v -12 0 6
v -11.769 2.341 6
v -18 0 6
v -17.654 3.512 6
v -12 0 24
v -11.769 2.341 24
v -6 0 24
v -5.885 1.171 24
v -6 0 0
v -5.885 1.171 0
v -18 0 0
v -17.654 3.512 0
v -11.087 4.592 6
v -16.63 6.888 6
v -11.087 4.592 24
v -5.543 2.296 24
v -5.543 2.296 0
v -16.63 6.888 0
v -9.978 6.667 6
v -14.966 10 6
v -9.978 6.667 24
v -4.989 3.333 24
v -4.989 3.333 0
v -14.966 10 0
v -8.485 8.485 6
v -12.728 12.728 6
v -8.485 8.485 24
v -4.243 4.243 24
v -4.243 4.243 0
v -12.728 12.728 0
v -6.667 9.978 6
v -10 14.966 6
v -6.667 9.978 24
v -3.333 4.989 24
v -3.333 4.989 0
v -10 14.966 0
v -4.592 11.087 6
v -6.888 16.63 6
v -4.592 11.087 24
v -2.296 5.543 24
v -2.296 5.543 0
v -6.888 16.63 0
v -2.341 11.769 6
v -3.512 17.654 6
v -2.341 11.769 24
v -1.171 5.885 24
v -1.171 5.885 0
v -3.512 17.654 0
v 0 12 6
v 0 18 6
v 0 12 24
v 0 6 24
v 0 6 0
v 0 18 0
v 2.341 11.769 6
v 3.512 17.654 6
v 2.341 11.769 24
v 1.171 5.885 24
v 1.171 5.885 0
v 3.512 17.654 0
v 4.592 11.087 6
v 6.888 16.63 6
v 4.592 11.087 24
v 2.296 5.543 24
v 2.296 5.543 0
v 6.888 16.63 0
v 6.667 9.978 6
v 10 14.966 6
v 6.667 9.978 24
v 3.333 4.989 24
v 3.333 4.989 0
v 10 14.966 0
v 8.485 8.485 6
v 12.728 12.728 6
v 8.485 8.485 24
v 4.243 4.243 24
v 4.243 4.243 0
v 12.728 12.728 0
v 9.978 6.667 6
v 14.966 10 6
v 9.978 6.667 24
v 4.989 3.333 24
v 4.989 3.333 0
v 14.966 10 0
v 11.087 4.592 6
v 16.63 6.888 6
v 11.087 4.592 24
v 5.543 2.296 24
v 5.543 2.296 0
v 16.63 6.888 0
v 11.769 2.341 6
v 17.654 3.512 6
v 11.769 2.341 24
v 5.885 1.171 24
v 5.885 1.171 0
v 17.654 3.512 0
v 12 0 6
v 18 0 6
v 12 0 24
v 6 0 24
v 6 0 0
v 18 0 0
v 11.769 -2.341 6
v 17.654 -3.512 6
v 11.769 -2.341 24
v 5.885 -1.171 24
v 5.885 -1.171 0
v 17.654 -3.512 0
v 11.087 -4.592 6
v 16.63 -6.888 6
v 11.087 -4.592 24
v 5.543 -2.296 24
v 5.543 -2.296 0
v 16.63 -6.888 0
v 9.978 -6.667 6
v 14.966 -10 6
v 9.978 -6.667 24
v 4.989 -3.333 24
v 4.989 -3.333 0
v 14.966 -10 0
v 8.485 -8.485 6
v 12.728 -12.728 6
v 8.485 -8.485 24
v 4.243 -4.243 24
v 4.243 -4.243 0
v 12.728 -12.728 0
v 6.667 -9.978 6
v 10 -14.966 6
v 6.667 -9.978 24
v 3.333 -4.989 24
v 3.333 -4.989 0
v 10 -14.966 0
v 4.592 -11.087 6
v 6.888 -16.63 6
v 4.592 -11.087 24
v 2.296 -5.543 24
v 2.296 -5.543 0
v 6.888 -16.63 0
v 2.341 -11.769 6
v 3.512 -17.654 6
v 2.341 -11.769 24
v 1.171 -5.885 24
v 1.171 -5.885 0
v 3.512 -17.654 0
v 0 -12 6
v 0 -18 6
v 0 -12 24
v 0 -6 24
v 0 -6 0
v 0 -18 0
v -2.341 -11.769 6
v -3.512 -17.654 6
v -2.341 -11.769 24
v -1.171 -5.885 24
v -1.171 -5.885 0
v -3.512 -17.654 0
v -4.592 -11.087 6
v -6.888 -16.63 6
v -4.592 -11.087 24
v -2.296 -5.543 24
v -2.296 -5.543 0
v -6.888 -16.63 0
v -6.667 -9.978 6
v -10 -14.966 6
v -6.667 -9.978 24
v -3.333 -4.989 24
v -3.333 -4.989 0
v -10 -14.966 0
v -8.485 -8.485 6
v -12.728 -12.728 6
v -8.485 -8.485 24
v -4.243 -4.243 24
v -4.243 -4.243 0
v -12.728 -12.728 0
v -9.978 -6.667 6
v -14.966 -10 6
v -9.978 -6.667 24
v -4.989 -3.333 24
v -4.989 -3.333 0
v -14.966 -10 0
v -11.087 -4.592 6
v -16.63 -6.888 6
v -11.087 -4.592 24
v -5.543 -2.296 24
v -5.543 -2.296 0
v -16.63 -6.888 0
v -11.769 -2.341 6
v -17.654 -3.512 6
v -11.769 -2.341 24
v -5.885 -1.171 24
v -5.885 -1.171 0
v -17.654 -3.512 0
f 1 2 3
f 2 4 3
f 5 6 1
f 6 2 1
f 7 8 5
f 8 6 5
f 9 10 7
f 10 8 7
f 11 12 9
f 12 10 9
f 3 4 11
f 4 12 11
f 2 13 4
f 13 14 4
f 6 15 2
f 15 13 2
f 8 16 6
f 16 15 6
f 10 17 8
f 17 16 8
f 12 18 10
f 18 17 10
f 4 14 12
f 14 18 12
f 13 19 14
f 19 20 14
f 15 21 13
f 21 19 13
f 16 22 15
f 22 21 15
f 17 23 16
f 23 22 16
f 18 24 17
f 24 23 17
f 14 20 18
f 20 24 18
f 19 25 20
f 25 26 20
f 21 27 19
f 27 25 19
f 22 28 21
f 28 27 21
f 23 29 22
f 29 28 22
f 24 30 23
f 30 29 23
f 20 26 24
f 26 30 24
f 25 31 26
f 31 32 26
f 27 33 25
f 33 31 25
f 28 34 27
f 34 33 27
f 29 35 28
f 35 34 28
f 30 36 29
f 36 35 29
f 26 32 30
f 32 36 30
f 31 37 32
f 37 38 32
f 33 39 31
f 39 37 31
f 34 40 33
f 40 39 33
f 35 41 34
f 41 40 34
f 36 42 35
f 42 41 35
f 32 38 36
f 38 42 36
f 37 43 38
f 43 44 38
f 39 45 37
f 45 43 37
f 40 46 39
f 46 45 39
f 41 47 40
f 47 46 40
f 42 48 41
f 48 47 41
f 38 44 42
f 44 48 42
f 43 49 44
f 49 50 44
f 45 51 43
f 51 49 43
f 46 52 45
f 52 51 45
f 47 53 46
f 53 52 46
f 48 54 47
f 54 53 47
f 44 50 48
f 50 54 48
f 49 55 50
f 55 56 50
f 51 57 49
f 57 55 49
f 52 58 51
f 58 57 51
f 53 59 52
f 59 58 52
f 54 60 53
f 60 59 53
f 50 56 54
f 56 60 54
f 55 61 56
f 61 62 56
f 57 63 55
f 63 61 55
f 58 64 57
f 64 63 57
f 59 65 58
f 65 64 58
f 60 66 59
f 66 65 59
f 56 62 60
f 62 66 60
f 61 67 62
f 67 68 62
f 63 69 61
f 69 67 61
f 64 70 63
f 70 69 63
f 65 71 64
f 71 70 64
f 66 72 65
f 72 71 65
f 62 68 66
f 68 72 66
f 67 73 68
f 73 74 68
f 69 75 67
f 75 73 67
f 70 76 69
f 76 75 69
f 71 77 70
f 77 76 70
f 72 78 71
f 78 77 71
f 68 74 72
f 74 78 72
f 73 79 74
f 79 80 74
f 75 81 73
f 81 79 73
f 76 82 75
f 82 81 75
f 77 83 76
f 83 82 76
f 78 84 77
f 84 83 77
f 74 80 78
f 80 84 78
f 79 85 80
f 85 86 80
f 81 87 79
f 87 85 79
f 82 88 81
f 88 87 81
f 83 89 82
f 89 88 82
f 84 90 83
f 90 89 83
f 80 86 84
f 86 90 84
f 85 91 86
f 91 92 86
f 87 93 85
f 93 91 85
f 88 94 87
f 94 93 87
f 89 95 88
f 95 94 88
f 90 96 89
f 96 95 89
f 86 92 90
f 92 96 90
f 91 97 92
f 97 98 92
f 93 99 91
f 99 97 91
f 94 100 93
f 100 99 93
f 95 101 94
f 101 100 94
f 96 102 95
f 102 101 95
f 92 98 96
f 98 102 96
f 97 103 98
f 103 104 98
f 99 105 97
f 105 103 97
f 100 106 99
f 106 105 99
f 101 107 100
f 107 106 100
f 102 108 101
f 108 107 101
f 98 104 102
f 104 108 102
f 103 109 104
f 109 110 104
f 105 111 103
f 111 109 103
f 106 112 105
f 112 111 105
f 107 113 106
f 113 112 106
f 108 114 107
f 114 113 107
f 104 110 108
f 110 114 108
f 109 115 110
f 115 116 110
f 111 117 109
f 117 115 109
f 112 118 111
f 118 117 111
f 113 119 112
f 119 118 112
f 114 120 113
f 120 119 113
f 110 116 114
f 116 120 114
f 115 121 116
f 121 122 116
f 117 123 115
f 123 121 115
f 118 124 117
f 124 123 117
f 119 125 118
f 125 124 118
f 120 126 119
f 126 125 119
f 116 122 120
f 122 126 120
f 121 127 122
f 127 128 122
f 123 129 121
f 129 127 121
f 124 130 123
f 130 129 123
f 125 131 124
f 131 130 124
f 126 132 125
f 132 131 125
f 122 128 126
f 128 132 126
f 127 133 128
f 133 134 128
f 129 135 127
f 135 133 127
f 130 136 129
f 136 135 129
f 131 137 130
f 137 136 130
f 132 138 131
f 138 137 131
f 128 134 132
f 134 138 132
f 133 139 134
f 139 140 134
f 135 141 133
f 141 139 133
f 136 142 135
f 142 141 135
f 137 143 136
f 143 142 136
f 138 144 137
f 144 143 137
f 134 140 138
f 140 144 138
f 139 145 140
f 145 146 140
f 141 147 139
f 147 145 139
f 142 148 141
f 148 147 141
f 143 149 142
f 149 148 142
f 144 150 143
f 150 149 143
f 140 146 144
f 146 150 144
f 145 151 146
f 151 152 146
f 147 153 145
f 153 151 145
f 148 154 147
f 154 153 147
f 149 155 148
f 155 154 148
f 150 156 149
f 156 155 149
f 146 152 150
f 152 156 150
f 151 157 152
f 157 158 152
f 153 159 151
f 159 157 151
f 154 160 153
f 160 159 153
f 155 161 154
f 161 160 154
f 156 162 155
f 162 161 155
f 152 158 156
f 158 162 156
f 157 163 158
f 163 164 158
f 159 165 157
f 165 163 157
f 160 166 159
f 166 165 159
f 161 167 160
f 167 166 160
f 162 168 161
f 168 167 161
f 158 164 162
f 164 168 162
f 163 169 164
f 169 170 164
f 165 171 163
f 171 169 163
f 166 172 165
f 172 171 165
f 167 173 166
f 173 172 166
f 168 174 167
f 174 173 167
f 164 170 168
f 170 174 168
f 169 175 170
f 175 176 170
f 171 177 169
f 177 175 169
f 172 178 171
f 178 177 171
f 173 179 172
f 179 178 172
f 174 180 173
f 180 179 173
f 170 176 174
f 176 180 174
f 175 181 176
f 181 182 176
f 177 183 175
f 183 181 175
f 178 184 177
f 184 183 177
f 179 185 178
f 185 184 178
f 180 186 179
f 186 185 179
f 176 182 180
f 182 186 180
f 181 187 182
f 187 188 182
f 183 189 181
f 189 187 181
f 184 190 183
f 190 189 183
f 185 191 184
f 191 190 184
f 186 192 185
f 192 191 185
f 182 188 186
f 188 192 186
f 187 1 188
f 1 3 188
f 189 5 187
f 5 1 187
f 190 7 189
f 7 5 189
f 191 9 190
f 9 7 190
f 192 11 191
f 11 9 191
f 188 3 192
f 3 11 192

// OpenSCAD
$fn = 32;

// ----------------------------------------------------------------------
// Revolved part: flanged bushing R18
// ----------------------------------------------------------------------

// --- parameters (mm) ---
bore_r = 6;               // bore radius
flange_r = 18;            // flange radius
flange_h = 6;             // flange thickness
sleeve_r = 12;            // sleeve radius
total_h = 24;             // overall height
revolve_angle = 360;      // revolve sweep, degrees
fit_tol = 0.02;           // declared fit tolerance (prompt contract)
free_tol = 0.2;           // declared free tolerance (prompt contract)

bore_d = 2 * bore_r;
flange_d = 2 * flange_r;
sleeve_d = 2 * sleeve_r;

profile = [[6, 0], [18, 0], [18, 6], [12, 6], [12, 24], [6, 24]];  // primary outline, 6 points, counter clockwise

// --- the one profile operation ---
rotate_extrude(angle = revolve_angle) polygon(points = profile);
